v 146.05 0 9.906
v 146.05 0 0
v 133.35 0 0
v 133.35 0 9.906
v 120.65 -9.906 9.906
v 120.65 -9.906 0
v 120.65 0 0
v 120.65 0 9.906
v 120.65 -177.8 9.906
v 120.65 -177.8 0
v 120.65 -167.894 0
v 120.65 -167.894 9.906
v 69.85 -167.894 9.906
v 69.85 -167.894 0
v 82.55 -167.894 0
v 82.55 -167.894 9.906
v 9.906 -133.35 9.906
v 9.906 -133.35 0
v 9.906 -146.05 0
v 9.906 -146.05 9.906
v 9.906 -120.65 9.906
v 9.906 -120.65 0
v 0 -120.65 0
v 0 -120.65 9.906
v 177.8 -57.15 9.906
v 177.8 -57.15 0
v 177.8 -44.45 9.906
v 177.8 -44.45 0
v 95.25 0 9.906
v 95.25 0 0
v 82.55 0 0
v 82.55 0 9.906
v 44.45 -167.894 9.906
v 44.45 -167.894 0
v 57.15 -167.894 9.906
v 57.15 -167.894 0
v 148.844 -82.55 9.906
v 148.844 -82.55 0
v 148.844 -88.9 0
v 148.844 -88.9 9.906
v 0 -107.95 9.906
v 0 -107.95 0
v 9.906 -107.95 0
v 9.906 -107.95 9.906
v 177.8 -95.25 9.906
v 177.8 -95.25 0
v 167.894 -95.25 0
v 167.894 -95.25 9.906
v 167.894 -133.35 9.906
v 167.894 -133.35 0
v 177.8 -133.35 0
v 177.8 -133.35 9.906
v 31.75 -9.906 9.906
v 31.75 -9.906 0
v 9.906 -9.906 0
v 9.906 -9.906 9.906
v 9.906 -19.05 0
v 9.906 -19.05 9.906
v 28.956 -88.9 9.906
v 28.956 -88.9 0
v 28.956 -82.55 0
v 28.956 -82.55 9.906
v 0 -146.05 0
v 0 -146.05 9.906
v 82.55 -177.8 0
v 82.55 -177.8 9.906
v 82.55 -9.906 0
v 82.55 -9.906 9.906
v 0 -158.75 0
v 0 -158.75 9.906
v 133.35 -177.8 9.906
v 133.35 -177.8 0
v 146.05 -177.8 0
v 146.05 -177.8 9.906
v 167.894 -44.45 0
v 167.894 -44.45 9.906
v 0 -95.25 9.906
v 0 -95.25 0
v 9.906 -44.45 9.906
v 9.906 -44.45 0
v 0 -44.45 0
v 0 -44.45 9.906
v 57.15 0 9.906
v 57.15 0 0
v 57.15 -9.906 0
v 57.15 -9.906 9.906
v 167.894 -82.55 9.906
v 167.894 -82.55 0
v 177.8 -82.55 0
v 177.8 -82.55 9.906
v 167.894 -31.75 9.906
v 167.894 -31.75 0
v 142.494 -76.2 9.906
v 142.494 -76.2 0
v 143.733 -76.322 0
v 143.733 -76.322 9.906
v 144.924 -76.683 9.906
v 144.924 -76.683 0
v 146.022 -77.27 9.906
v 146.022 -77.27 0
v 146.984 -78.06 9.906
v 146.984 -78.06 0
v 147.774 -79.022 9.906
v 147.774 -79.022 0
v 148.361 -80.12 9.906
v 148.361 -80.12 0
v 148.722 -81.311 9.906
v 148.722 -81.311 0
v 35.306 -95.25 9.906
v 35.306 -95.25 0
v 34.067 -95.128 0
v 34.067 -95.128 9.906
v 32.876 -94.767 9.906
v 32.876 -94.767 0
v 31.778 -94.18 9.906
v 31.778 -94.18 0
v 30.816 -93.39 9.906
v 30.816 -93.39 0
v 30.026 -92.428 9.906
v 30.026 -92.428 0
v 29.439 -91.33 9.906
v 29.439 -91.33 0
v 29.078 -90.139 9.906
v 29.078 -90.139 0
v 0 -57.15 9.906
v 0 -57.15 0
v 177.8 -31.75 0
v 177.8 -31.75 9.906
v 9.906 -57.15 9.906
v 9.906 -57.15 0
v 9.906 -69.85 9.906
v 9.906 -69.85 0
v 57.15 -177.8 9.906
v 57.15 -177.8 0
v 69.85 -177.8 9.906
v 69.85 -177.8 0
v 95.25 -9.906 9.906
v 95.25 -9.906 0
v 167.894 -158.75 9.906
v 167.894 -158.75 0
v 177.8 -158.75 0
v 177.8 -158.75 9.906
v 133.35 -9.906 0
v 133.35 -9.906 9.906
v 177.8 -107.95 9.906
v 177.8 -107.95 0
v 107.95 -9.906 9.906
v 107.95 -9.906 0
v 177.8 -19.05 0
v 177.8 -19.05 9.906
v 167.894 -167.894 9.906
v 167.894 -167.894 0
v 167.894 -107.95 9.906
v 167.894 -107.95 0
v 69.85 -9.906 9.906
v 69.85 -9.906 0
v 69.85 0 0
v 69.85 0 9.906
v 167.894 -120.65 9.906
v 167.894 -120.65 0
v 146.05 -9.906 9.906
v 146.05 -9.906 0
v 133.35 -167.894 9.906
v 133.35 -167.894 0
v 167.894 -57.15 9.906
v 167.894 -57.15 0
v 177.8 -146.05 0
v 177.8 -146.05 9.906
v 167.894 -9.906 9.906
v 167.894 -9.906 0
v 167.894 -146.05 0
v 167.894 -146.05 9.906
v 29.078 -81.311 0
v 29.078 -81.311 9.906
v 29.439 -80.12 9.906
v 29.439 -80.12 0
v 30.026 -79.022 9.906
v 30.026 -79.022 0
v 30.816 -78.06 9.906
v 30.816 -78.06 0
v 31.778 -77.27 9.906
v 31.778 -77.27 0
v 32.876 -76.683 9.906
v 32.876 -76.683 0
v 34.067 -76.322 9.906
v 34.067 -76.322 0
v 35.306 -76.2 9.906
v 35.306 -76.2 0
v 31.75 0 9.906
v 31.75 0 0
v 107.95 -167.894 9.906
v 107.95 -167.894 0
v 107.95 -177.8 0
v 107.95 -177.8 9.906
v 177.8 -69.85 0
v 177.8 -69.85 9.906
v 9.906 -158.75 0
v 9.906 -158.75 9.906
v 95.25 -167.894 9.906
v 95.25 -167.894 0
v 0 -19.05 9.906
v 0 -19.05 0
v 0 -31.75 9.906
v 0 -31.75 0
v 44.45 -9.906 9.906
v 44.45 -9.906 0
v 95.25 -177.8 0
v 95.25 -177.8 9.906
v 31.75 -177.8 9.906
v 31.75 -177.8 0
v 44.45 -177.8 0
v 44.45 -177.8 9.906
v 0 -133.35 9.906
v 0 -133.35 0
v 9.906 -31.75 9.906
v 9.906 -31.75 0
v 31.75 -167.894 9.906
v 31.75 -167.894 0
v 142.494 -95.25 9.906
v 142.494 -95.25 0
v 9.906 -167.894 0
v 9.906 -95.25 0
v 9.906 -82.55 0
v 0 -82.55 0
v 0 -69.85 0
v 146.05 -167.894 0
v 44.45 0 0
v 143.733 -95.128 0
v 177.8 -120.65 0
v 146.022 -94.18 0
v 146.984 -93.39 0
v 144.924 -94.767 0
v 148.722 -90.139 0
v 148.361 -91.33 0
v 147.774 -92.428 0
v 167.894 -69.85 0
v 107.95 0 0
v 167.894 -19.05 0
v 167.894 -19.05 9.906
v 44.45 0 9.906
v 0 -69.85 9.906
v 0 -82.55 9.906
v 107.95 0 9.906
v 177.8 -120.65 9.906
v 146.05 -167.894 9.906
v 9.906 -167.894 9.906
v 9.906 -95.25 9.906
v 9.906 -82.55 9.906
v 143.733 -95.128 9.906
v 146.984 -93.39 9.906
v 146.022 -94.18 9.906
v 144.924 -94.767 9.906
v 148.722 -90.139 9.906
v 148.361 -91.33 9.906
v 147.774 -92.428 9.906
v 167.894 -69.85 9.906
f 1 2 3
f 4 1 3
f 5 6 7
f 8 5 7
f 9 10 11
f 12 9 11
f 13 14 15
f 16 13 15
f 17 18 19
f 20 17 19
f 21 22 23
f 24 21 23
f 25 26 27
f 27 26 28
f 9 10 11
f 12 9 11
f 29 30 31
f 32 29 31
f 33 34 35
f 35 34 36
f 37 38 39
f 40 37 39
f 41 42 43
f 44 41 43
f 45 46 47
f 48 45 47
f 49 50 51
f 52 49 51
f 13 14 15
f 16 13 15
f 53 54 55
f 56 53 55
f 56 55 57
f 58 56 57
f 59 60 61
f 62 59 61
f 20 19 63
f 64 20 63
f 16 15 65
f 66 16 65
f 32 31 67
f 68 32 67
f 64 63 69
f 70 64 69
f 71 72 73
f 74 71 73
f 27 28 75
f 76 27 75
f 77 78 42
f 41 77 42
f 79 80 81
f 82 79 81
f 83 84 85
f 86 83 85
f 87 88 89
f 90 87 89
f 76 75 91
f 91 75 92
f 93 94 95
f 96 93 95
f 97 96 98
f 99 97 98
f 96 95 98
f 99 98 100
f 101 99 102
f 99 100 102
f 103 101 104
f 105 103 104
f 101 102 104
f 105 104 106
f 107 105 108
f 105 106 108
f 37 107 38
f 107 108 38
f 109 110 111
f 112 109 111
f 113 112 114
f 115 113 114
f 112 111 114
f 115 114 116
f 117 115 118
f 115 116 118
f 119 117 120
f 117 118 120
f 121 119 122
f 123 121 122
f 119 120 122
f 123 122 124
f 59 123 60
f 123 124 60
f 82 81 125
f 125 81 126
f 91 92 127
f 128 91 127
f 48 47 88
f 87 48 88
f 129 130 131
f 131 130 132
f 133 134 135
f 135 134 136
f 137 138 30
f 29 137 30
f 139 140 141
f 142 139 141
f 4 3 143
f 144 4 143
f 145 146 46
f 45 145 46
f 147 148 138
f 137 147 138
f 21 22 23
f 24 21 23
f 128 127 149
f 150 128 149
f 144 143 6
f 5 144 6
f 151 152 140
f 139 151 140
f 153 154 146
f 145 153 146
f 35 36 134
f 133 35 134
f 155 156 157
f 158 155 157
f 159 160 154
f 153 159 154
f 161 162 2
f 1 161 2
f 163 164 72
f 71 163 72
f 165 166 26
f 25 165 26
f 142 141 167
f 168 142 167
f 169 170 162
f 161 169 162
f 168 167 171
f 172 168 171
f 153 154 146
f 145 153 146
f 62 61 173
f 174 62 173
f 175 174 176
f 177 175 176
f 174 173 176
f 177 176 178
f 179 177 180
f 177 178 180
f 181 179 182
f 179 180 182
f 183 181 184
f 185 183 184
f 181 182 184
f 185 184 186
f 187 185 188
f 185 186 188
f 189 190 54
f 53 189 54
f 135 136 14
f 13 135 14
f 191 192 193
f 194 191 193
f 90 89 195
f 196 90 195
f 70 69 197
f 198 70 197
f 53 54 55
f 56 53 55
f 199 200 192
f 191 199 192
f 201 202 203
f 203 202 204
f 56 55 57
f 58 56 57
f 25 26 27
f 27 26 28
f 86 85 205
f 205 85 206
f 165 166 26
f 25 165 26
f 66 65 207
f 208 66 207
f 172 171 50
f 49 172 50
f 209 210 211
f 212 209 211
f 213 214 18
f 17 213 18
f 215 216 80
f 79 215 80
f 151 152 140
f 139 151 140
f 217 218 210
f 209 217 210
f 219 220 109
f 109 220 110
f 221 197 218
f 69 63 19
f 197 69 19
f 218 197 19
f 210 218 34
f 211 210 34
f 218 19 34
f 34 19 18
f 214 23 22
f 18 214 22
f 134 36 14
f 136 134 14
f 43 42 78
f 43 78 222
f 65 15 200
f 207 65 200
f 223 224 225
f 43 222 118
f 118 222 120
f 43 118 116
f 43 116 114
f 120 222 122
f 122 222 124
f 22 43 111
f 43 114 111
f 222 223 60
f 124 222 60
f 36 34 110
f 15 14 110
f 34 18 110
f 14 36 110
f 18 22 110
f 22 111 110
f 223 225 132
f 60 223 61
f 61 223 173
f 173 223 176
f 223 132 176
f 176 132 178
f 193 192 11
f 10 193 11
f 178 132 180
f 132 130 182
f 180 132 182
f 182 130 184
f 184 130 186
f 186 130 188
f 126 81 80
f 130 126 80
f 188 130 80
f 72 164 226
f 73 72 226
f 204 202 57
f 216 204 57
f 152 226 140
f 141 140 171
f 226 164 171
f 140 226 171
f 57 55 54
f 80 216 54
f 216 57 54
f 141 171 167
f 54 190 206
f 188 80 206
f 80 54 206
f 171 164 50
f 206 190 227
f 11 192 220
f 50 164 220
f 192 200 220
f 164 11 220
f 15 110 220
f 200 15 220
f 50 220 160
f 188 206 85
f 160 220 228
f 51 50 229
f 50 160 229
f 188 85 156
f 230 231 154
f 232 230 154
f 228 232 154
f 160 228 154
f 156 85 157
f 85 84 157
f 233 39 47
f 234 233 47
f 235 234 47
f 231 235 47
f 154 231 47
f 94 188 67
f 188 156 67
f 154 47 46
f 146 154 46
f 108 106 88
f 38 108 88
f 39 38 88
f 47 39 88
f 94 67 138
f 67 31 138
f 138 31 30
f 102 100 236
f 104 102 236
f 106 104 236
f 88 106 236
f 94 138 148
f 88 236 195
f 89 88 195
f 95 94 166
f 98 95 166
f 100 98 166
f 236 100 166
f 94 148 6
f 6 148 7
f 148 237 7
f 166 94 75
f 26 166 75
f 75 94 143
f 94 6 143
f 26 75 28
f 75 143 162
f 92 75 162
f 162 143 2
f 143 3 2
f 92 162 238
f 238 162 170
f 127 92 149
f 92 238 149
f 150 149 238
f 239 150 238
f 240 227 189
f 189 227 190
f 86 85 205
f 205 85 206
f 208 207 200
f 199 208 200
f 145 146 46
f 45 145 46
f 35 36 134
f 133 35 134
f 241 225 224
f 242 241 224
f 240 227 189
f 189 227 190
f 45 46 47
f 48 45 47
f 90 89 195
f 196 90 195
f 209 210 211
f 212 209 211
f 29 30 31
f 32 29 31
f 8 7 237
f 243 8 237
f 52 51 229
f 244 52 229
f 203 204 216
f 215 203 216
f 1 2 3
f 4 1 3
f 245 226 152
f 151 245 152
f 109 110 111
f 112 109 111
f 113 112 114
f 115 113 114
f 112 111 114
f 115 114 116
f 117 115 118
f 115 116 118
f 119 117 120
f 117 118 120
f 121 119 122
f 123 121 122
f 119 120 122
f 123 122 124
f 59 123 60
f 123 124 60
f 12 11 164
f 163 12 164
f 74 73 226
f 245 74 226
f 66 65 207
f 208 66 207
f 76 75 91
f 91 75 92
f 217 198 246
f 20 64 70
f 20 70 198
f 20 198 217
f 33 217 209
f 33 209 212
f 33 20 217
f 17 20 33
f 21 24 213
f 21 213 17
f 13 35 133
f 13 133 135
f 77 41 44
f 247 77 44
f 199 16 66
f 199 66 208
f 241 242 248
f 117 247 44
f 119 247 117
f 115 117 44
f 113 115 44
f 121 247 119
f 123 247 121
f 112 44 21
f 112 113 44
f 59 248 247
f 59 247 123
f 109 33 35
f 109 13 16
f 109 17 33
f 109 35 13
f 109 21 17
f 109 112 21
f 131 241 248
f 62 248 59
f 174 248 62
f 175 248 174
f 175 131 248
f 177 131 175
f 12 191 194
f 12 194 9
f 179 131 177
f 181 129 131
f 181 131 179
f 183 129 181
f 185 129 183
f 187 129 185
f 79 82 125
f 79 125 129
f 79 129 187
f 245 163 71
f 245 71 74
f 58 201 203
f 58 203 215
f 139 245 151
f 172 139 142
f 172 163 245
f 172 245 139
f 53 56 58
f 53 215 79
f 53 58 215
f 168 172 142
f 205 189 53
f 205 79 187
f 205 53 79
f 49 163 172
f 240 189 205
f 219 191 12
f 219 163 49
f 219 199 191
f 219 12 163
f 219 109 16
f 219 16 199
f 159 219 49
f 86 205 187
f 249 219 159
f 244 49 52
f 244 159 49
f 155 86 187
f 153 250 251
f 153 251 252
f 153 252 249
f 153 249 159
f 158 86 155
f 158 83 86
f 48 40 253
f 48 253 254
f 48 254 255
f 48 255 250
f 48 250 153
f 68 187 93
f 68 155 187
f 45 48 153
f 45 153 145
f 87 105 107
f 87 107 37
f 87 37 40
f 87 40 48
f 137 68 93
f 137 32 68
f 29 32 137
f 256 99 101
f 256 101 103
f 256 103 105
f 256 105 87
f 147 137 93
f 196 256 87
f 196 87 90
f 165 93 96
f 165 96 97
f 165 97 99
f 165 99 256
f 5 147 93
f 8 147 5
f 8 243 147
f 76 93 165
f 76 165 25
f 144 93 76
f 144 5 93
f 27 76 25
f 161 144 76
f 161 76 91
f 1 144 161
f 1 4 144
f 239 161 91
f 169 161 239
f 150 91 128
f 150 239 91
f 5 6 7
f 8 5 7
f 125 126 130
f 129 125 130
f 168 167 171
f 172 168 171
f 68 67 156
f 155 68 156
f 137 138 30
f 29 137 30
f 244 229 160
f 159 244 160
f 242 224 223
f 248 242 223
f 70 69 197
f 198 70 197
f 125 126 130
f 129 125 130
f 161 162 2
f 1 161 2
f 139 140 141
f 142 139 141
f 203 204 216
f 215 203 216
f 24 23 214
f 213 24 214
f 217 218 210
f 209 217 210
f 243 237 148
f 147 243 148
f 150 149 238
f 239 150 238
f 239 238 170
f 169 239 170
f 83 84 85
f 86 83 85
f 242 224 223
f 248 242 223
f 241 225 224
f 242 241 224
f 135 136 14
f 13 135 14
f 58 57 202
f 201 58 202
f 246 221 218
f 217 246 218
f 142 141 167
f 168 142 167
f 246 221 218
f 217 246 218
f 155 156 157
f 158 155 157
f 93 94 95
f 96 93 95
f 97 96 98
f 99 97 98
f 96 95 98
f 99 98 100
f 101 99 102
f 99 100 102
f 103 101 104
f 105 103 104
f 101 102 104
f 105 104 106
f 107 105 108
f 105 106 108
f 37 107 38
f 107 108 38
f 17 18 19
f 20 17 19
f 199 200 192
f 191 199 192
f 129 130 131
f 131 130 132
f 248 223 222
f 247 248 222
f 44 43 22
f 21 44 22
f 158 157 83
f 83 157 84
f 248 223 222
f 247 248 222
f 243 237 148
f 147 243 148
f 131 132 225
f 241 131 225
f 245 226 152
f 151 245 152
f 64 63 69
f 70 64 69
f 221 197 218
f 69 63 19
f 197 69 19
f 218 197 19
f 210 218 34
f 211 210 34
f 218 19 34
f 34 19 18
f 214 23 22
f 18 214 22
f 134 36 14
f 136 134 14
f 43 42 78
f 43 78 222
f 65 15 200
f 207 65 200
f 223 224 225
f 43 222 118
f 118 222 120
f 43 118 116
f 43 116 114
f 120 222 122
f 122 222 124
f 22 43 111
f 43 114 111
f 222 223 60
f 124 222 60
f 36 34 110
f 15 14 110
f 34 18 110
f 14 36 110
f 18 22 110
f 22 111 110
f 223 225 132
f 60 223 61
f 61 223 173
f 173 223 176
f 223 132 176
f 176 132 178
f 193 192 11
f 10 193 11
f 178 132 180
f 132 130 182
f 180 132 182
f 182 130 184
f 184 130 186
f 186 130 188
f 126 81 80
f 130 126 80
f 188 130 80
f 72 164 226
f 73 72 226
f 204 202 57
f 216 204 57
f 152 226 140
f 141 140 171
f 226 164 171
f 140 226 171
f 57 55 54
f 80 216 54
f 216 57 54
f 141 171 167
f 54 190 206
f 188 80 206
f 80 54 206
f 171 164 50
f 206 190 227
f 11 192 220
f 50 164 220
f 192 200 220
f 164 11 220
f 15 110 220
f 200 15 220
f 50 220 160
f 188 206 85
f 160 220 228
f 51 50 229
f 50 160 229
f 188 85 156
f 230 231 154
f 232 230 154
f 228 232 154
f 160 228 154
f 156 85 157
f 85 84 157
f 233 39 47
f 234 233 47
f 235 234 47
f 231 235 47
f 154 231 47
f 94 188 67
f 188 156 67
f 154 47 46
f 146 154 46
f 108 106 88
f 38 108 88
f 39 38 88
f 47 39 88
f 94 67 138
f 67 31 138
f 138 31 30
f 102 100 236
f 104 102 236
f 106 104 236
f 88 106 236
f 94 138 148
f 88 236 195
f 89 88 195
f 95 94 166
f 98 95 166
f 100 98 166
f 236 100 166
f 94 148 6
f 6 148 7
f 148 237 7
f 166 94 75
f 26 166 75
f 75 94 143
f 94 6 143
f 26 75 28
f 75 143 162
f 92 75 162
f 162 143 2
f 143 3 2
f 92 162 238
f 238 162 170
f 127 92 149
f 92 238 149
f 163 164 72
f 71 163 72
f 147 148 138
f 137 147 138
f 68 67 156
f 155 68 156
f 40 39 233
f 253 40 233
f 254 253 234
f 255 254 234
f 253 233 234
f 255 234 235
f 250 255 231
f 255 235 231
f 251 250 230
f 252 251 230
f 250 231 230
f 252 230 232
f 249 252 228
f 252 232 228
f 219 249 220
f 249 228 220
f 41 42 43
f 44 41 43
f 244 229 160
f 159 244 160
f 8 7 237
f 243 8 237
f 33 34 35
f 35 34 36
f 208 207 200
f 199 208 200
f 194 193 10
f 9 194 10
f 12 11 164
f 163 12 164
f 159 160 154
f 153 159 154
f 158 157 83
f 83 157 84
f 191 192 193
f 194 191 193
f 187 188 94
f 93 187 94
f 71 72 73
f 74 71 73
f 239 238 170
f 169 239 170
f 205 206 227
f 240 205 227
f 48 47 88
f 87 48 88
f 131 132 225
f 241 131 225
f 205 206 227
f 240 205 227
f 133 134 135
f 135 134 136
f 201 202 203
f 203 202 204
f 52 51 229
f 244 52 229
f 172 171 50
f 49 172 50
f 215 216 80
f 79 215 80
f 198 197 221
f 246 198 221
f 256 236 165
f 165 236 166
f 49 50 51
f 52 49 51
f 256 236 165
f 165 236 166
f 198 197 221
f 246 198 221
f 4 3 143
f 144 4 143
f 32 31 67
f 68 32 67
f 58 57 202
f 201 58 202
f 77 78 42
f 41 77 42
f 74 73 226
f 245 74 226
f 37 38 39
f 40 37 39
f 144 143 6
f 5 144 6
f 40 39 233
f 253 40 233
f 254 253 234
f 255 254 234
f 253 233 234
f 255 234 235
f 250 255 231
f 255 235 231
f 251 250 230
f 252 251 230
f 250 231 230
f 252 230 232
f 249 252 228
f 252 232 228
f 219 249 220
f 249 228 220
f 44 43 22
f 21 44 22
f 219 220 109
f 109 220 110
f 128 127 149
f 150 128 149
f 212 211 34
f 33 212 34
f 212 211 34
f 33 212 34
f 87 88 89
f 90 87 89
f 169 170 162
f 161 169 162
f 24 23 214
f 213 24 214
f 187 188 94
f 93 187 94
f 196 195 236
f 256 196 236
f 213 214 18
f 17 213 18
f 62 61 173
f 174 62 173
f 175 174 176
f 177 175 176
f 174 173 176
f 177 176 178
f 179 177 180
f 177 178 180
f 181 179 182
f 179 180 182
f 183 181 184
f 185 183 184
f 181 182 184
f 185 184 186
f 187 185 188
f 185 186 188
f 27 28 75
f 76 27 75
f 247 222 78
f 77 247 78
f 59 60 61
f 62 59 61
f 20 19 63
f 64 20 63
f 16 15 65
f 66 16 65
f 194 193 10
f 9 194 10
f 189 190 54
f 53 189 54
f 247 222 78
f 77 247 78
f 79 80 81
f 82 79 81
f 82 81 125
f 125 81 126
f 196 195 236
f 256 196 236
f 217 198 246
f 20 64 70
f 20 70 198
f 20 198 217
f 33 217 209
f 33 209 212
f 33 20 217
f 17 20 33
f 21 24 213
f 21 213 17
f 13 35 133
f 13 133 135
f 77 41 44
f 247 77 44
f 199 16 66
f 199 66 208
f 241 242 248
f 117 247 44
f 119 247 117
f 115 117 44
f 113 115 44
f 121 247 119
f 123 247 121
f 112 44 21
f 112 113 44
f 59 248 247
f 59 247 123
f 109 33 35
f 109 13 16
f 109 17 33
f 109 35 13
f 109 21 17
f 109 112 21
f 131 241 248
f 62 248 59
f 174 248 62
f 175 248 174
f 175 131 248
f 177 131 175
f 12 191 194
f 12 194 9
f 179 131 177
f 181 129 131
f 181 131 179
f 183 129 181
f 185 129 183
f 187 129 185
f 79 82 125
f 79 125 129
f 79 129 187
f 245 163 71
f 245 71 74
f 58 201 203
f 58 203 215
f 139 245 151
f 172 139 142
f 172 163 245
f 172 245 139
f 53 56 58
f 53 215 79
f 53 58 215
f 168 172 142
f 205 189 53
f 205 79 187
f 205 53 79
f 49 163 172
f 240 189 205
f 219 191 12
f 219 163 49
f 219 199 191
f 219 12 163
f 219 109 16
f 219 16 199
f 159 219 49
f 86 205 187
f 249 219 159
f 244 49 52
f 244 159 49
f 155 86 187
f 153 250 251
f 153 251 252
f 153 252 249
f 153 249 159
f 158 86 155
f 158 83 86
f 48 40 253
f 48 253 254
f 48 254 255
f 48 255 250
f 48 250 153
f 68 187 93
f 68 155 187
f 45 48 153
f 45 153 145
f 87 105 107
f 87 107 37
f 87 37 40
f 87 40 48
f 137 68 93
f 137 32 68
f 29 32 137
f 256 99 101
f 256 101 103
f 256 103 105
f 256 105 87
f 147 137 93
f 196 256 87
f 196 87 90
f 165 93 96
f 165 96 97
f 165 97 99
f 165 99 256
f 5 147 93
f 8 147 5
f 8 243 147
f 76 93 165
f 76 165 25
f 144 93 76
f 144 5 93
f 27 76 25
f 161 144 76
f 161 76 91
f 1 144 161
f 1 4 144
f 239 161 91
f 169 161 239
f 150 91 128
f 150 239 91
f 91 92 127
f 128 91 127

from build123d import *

# Parameters (mm, degrees)
F1_DEPTH = 9.906
F2_DEPTH = 9.906


with BuildPart() as f1:
    # F0 (on Top) → F1 (new body)
    with BuildSketch(Plane.XY):
        Polygon((44.45, 0), (31.75, 0), (31.75, -9.906), (9.906, -9.906), (9.906, -19.05), (0, -19.05), (0, -31.75), (9.906, -31.75), (9.906, -44.45), (0, -44.45), (0, -57.15), (9.906, -57.15), (9.906, -69.85), (0, -69.85), (0, -82.55), (9.906, -82.55), (9.906, -95.25), (0, -95.25), (0, -107.949999), (9.906, -107.949999), (9.906, -120.649999), (0, -120.649999), (0, -133.349999), (9.906, -133.349999), (9.906, -146.049999), (0, -146.049999), (0, -158.749999), (9.906, -158.749999), (9.906, -167.893999), (31.75, -167.893999), (31.75, -177.799999), (44.45, -177.799999), (44.45, -167.893999), (57.15, -167.893999), (57.15, -177.799999), (69.85, -177.799999), (69.85, -167.893999), (82.55, -167.893999), (82.55, -177.799999), (95.25, -177.799999), (95.25, -167.893999), (107.95, -167.893999), (107.95, -177.799999), (120.649999, -177.799999), (120.649999, -167.893999), (133.349999, -167.893999), (133.349999, -177.799999), (146.049999, -177.799999), (146.049999, -167.893999), (167.893999, -167.893999), (167.893999, -158.749999), (177.799999, -158.749999), (177.799999, -146.049999), (167.893999, -146.049999), (167.893999, -133.349999), (177.799999, -133.349999), (177.799999, -120.649999), (167.893999, -120.649999), (167.893999, -107.949999), (177.799999, -107.949999), (177.799999, -95.25), (167.893999, -95.25), (167.893999, -82.55), (177.799999, -82.55), (177.799999, -69.85), (167.893999, -69.85), (167.893999, -57.15), (177.799999, -57.15), (177.799999, -44.45), (167.893999, -44.45), (167.893999, -31.75), (177.799999, -31.75), (177.799999, -19.05), (167.893999, -19.05), (167.893999, -9.906), (146.049999, -9.906), (146.049999, 0), (133.349999, 0), (133.349999, -9.906), (120.649999, -9.906), (120.649999, 0), (107.95, 0), (107.95, -9.906), (95.25, -9.906), (95.25, 0), (82.55, 0), (82.55, -9.906), (69.85, -9.906), (69.85, 0), (57.15, 0), (57.15, -9.906), (44.45, -9.906), align=None)
        with BuildLine():
            ThreePointArc((28.956, -82.55), (30.815872, -78.059872), (35.306, -76.2))
            Line((35.306, -76.2), (142.493999, -76.2))
            ThreePointArc((142.493999, -76.2), (146.984127, -78.059872), (148.843999, -82.55))
            Line((148.843999, -82.55), (148.843999, -88.9))
            ThreePointArc((148.843999, -88.9), (146.984127, -93.390128), (142.493999, -95.25))
            Line((142.493999, -95.25), (35.306, -95.25))
            ThreePointArc((35.306, -95.25), (30.815872, -93.390128), (28.956, -88.9))
            Line((28.956, -88.9), (28.956, -82.55))
        make_face(mode=Mode.SUBTRACT)
    extrude(amount=F1_DEPTH)


with BuildPart() as f2:
    # F0 (on Top) → F2 (new body)
    with BuildSketch(Plane.XY):
        Polygon((44.45, 0), (31.75, 0), (31.75, -9.906), (9.906, -9.906), (9.906, -19.05), (0, -19.05), (0, -31.75), (9.906, -31.75), (9.906, -44.45), (0, -44.45), (0, -57.15), (9.906, -57.15), (9.906, -69.85), (0, -69.85), (0, -82.55), (9.906, -82.55), (9.906, -95.25), (0, -95.25), (0, -107.949999), (9.906, -107.949999), (9.906, -120.649999), (0, -120.649999), (0, -133.349999), (9.906, -133.349999), (9.906, -146.049999), (0, -146.049999), (0, -158.749999), (9.906, -158.749999), (9.906, -167.893999), (31.75, -167.893999), (31.75, -177.799999), (44.45, -177.799999), (44.45, -167.893999), (57.15, -167.893999), (57.15, -177.799999), (69.85, -177.799999), (69.85, -167.893999), (82.55, -167.893999), (82.55, -177.799999), (95.25, -177.799999), (95.25, -167.893999), (107.95, -167.893999), (107.95, -177.799999), (120.649999, -177.799999), (120.649999, -167.893999), (133.349999, -167.893999), (133.349999, -177.799999), (146.049999, -177.799999), (146.049999, -167.893999), (167.893999, -167.893999), (167.893999, -158.749999), (177.799999, -158.749999), (177.799999, -146.049999), (167.893999, -146.049999), (167.893999, -133.349999), (177.799999, -133.349999), (177.799999, -120.649999), (167.893999, -120.649999), (167.893999, -107.949999), (177.799999, -107.949999), (177.799999, -95.25), (167.893999, -95.25), (167.893999, -82.55), (177.799999, -82.55), (177.799999, -69.85), (167.893999, -69.85), (167.893999, -57.15), (177.799999, -57.15), (177.799999, -44.45), (167.893999, -44.45), (167.893999, -31.75), (177.799999, -31.75), (177.799999, -19.05), (167.893999, -19.05), (167.893999, -9.906), (146.049999, -9.906), (146.049999, 0), (133.349999, 0), (133.349999, -9.906), (120.649999, -9.906), (120.649999, 0), (107.95, 0), (107.95, -9.906), (95.25, -9.906), (95.25, 0), (82.55, 0), (82.55, -9.906), (69.85, -9.906), (69.85, 0), (57.15, 0), (57.15, -9.906), (44.45, -9.906), align=None)
        with BuildLine():
            ThreePointArc((28.956, -82.55), (30.815872, -78.059872), (35.306, -76.2))
            Line((35.306, -76.2), (142.493999, -76.2))
            ThreePointArc((142.493999, -76.2), (146.984127, -78.059872), (148.843999, -82.55))
            Line((148.843999, -82.55), (148.843999, -88.9))
            ThreePointArc((148.843999, -88.9), (146.984127, -93.390128), (142.493999, -95.25))
            Line((142.493999, -95.25), (35.306, -95.25))
            ThreePointArc((35.306, -95.25), (30.815872, -93.390128), (28.956, -88.9))
            Line((28.956, -88.9), (28.956, -82.55))
        make_face(mode=Mode.SUBTRACT)
    extrude(amount=F2_DEPTH)


solid = Compound([f1.part, f2.part])
